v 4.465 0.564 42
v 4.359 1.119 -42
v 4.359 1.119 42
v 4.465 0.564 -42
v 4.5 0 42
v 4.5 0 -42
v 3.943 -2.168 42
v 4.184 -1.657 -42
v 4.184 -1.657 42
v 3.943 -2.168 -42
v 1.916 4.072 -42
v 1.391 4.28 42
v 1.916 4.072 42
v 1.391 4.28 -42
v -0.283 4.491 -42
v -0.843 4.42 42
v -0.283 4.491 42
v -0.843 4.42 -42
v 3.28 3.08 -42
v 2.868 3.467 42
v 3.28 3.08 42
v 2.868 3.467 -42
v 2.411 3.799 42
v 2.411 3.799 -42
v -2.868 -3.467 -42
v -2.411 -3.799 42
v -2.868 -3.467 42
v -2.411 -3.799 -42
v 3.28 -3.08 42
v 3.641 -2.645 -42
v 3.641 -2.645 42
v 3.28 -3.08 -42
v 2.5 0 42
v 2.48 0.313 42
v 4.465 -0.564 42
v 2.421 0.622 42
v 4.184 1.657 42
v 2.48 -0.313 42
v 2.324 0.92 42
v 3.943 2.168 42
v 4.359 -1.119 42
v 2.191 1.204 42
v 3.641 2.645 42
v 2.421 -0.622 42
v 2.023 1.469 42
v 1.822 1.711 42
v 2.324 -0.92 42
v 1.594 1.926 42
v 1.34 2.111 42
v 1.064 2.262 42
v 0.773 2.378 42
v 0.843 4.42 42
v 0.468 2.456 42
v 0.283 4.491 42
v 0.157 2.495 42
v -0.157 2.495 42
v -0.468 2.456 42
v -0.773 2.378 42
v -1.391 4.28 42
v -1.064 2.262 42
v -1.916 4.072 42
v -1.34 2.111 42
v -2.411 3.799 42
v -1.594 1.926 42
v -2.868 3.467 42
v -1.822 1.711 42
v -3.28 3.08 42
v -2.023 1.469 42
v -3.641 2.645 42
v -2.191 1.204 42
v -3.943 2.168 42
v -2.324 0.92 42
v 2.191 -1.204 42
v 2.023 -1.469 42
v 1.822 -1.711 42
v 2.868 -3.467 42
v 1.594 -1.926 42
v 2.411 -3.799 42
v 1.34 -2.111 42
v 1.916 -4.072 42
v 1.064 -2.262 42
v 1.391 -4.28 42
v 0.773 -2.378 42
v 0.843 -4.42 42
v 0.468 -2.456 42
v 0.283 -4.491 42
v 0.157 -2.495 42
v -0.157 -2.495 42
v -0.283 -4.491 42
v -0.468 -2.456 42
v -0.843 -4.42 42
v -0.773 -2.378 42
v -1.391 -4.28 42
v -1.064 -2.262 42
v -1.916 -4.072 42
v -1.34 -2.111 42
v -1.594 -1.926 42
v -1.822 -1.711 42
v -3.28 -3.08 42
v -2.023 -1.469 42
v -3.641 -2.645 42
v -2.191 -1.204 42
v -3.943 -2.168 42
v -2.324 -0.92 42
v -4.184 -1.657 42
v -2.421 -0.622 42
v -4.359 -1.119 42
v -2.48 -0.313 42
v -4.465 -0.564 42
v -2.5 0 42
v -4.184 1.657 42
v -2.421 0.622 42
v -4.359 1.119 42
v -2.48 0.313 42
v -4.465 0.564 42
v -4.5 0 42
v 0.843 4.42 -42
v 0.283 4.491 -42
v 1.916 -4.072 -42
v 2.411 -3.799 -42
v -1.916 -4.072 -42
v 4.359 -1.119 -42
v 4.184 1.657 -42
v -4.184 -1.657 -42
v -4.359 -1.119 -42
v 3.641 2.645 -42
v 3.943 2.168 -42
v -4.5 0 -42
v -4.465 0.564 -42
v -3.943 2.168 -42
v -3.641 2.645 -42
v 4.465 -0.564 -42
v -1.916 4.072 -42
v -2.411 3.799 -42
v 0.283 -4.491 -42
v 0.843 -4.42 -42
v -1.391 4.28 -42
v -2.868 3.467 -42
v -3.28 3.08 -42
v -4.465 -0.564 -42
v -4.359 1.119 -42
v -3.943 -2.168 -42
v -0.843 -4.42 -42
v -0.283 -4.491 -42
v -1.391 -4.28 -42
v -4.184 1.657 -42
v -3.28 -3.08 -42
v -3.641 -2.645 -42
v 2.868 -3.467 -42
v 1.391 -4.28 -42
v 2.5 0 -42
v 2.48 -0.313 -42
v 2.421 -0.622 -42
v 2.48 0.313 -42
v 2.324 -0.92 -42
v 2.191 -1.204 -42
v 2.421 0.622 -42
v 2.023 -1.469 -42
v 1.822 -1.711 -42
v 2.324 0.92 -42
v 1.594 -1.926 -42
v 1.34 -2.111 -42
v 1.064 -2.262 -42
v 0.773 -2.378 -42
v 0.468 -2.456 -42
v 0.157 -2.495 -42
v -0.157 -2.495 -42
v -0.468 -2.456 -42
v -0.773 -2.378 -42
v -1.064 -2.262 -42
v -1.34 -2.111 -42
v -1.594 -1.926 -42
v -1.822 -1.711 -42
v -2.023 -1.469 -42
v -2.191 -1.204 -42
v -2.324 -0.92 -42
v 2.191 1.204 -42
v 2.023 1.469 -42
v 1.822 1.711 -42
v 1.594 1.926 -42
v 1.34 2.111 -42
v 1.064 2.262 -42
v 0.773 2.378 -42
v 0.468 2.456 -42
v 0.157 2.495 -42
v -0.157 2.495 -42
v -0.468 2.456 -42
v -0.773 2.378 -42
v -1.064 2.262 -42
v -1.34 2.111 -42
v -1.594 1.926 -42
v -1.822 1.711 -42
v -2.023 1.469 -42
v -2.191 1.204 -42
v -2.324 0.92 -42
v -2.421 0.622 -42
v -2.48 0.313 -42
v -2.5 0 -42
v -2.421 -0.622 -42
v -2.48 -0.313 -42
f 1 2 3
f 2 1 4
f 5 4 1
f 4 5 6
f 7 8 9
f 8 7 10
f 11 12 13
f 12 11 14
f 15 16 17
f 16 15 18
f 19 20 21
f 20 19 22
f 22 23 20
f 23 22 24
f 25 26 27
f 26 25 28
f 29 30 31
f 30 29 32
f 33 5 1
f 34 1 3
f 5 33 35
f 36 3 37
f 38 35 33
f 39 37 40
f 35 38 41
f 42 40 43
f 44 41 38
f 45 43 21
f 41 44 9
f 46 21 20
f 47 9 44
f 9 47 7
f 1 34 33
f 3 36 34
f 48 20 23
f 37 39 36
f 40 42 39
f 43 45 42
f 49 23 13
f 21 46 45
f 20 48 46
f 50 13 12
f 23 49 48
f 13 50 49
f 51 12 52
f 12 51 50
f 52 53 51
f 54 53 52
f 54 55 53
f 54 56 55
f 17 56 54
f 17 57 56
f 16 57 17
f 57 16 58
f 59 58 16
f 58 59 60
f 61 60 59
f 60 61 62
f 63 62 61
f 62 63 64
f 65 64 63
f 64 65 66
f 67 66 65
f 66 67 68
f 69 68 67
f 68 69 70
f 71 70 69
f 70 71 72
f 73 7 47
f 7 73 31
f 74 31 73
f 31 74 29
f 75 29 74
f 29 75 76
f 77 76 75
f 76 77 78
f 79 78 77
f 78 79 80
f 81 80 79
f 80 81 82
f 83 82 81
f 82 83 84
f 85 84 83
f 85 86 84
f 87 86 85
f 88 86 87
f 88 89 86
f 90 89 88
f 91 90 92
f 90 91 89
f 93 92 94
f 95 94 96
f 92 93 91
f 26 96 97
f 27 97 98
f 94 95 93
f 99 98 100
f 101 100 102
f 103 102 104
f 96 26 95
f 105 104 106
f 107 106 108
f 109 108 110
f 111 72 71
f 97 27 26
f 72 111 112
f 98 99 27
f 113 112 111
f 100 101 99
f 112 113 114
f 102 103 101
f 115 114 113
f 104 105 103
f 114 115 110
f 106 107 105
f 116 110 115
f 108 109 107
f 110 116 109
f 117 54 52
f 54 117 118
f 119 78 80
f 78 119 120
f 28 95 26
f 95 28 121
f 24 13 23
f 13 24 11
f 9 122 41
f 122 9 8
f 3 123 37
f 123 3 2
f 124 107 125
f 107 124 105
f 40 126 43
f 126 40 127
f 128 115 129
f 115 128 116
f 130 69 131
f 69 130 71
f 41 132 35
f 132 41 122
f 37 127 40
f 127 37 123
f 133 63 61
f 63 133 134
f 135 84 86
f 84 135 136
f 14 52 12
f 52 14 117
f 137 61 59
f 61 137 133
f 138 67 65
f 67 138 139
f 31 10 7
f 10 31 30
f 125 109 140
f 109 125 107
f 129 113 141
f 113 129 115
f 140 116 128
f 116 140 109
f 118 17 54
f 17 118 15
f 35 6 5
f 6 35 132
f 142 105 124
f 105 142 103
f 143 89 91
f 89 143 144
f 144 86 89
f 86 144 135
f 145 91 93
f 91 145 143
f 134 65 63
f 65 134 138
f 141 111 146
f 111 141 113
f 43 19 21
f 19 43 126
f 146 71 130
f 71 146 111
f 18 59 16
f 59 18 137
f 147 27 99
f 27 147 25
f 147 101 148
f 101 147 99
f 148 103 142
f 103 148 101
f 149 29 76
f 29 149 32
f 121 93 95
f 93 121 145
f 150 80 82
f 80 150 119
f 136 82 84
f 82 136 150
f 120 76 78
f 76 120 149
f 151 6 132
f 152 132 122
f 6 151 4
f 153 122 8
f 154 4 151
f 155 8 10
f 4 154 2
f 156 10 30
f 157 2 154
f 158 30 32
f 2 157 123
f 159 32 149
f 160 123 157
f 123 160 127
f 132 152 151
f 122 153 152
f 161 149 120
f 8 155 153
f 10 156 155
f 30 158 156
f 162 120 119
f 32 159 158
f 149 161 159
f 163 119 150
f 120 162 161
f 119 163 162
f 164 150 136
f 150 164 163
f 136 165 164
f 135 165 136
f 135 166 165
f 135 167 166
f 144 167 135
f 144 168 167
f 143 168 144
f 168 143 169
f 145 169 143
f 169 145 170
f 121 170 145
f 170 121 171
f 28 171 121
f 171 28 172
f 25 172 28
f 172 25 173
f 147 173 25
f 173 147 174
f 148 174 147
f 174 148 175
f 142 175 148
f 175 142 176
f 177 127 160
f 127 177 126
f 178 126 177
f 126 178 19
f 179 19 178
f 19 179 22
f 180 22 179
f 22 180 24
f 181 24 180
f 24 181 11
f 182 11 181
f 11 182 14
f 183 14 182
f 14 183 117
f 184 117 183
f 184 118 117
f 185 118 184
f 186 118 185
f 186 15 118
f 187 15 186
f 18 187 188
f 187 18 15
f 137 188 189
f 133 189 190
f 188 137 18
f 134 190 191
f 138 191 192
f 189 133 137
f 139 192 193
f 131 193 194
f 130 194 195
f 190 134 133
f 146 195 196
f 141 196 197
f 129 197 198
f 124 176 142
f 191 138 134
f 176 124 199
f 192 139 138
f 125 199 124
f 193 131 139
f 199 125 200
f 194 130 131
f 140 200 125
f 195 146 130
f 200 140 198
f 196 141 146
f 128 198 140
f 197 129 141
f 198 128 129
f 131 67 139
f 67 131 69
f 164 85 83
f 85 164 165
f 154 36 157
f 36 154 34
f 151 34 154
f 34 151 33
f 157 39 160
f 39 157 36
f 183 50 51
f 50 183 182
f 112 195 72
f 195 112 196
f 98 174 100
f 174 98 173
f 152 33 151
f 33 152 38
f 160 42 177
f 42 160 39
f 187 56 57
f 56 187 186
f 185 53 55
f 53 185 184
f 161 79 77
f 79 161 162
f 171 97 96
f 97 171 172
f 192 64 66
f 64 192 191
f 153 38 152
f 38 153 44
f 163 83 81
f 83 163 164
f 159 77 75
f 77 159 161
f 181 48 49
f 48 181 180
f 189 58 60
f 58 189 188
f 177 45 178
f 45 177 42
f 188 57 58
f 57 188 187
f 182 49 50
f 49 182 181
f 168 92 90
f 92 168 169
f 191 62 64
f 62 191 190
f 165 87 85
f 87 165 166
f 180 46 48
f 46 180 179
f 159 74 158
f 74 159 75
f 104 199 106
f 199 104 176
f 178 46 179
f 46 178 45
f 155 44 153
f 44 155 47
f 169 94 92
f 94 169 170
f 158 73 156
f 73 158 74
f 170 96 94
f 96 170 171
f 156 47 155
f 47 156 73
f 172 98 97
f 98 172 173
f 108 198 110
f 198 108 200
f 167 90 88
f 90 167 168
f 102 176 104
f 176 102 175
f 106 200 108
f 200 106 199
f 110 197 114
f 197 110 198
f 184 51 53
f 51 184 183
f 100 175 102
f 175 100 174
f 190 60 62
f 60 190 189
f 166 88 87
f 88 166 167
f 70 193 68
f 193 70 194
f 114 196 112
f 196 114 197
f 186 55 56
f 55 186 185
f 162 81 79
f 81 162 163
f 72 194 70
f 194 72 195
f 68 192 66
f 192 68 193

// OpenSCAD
$fn = 50;


difference() {
	union() {
		translate(v = [0, 0, -42.0000000000]) {
			cylinder(h = 84, r = 4.5000000000);
		}
	}
	union() {
		translate(v = [0, 0, -100.0000000000]) {
			cylinder(h = 200, r = 2.5000000000);
		}
	}
}
